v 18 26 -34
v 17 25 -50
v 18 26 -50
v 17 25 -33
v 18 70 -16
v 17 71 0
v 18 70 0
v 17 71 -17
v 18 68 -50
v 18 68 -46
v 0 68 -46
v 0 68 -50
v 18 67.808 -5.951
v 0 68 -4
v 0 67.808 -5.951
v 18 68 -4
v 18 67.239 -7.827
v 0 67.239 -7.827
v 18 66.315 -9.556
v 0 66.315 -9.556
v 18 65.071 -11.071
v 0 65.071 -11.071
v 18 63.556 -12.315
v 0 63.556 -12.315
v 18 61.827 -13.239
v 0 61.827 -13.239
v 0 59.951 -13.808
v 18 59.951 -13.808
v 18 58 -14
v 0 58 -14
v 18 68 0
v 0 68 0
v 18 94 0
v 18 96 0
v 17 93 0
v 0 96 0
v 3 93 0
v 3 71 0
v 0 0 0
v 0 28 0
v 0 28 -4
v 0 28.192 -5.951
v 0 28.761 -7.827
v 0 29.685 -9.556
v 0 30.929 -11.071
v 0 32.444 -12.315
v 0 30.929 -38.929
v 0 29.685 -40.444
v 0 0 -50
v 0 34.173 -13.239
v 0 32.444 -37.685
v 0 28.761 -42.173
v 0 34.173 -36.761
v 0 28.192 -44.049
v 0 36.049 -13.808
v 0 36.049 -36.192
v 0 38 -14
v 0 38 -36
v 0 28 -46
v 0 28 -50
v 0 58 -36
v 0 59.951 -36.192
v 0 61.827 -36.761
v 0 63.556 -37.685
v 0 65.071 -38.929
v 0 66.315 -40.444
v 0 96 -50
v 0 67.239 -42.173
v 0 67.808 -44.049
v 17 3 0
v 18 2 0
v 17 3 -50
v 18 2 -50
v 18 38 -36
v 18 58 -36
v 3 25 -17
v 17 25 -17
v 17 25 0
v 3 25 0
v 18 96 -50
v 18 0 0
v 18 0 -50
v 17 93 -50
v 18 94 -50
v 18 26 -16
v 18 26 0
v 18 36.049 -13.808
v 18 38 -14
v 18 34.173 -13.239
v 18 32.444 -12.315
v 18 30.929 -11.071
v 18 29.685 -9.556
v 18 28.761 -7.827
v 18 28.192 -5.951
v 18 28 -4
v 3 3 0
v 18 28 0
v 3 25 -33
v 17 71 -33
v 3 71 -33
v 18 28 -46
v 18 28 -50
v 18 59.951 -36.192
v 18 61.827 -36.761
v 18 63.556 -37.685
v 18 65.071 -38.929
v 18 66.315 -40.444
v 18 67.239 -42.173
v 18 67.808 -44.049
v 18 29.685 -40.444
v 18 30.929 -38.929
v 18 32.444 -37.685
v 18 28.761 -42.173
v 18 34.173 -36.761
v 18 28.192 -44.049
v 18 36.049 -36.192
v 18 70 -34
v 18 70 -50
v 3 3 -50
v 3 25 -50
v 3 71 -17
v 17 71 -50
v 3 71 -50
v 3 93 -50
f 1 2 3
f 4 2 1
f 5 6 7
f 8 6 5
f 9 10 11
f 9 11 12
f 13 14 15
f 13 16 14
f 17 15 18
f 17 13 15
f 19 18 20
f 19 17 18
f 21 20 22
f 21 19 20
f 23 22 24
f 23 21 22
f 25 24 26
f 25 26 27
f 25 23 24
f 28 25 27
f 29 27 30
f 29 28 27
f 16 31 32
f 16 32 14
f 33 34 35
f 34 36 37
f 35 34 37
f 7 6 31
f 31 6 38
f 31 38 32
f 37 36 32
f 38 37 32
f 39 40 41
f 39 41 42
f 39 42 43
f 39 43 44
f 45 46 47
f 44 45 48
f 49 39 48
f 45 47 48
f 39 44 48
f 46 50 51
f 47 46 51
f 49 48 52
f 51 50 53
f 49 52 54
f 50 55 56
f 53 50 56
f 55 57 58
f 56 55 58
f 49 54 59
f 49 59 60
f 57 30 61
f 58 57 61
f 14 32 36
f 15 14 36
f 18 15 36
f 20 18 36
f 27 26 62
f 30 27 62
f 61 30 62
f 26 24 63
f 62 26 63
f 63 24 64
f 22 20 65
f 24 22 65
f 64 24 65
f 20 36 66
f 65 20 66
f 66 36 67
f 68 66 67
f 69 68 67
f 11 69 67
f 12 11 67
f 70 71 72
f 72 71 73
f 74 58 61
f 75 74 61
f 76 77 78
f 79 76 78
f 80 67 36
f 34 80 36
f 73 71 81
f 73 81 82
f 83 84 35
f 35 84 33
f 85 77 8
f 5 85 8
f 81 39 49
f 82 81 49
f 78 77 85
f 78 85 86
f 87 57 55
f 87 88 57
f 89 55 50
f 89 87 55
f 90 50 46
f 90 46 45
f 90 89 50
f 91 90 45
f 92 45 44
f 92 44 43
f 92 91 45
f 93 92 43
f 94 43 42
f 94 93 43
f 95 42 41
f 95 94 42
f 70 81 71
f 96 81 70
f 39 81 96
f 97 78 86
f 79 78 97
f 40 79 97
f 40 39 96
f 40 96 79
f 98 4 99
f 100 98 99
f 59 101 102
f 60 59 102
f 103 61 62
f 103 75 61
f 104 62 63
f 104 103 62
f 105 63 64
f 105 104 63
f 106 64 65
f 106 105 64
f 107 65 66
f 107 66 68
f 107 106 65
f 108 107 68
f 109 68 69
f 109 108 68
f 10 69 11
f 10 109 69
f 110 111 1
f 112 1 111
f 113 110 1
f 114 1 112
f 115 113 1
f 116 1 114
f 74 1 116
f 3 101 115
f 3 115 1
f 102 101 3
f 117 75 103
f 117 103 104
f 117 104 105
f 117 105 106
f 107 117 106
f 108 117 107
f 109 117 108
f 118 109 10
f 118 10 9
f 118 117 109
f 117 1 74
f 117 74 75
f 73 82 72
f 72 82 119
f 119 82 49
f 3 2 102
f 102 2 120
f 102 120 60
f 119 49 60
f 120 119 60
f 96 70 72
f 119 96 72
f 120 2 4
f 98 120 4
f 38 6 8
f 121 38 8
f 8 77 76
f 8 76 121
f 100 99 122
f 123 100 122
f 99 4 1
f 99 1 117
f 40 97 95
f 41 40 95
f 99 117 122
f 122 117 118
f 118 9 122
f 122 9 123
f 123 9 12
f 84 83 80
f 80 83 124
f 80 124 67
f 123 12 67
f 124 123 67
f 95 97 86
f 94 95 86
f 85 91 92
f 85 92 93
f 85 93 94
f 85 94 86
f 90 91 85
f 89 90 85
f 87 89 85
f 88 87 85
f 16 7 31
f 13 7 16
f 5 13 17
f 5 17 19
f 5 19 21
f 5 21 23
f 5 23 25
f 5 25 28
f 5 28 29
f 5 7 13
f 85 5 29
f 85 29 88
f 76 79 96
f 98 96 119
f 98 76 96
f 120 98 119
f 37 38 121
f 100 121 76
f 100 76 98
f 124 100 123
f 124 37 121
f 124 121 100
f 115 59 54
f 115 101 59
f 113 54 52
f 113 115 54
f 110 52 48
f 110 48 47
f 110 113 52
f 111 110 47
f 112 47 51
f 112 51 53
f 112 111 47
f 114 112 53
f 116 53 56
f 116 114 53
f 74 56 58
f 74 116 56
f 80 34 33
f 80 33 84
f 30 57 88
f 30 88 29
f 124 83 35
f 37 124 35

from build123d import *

# Parameters (mm, degrees)
SKETCH1_W           = 22
SKETCH1_H           = 40
SKETCH1_W_2         = 50
SKETCH1_H_2         = 28
BOSS_EXTRUDE1_DEPTH = 18
SKETCH2_W           = 16
SKETCH2_H           = 46
CUT_EXTRUDE1_DEPTH  = 15
FILLET1_R           = 10
CHAMFER1_SIZE       = 1


with BuildPart() as part:
    # Sketch1 → Boss-Extrude1 (new body)
    with BuildSketch(Plane(origin=(0, 0, 0), x_dir=(0, 0, -1), z_dir=(1, 0, 0))):
        Polygon((0, 68), (14, 68), (36, 68), (50, 68), (50, 96), (0, 96), align=None)
        with Locations((25, 48)):
            Rectangle(SKETCH1_W, SKETCH1_H)
        with Locations((25, 14)):
            Rectangle(SKETCH1_W_2, SKETCH1_H_2)
    extrude(amount=BOSS_EXTRUDE1_DEPTH)

    # Sketch2 → Cut-Extrude1 (cut)
    with BuildSketch(Plane(origin=(18, 0, 0), x_dir=(0, 0, -1), z_dir=(1, 0, 0))):
        Polygon((50, 93), (0, 93), (0, 71), (17, 71), (33, 71), (50, 71), align=None)
        with Locations((25, 48)):
            Rectangle(SKETCH2_W, SKETCH2_H)
        Polygon((33, 25), (17, 25), (0, 25), (0, 3), (50, 3), (50, 25), align=None)
    extrude(amount=-CUT_EXTRUDE1_DEPTH, mode=Mode.SUBTRACT)

    # Fillet1
    fillet1_edges = [part.edges().sort_by_distance(p)[0] for p in [
        (9, 68, -36),
        (9, 28, -36),
        (9, 28, -14),
        (9, 68, -14),
    ]]
    fillet(fillet1_edges, radius=FILLET1_R)

    # Chamfer1
    chamfer1_edges = [part.edges().sort_by_distance(p)[0] for p in [
        (18, 93, -25),
        (18, 48, -33),
        (18, 25, -41.5),
        (18, 25, -8.5),
        (18, 71, -8.5),
        (18, 48, -17),
        (18, 3, -25),
        (18, 71, -41.5),
    ]]
    chamfer(chamfer1_edges, length=CHAMFER1_SIZE)


solid = part.part
